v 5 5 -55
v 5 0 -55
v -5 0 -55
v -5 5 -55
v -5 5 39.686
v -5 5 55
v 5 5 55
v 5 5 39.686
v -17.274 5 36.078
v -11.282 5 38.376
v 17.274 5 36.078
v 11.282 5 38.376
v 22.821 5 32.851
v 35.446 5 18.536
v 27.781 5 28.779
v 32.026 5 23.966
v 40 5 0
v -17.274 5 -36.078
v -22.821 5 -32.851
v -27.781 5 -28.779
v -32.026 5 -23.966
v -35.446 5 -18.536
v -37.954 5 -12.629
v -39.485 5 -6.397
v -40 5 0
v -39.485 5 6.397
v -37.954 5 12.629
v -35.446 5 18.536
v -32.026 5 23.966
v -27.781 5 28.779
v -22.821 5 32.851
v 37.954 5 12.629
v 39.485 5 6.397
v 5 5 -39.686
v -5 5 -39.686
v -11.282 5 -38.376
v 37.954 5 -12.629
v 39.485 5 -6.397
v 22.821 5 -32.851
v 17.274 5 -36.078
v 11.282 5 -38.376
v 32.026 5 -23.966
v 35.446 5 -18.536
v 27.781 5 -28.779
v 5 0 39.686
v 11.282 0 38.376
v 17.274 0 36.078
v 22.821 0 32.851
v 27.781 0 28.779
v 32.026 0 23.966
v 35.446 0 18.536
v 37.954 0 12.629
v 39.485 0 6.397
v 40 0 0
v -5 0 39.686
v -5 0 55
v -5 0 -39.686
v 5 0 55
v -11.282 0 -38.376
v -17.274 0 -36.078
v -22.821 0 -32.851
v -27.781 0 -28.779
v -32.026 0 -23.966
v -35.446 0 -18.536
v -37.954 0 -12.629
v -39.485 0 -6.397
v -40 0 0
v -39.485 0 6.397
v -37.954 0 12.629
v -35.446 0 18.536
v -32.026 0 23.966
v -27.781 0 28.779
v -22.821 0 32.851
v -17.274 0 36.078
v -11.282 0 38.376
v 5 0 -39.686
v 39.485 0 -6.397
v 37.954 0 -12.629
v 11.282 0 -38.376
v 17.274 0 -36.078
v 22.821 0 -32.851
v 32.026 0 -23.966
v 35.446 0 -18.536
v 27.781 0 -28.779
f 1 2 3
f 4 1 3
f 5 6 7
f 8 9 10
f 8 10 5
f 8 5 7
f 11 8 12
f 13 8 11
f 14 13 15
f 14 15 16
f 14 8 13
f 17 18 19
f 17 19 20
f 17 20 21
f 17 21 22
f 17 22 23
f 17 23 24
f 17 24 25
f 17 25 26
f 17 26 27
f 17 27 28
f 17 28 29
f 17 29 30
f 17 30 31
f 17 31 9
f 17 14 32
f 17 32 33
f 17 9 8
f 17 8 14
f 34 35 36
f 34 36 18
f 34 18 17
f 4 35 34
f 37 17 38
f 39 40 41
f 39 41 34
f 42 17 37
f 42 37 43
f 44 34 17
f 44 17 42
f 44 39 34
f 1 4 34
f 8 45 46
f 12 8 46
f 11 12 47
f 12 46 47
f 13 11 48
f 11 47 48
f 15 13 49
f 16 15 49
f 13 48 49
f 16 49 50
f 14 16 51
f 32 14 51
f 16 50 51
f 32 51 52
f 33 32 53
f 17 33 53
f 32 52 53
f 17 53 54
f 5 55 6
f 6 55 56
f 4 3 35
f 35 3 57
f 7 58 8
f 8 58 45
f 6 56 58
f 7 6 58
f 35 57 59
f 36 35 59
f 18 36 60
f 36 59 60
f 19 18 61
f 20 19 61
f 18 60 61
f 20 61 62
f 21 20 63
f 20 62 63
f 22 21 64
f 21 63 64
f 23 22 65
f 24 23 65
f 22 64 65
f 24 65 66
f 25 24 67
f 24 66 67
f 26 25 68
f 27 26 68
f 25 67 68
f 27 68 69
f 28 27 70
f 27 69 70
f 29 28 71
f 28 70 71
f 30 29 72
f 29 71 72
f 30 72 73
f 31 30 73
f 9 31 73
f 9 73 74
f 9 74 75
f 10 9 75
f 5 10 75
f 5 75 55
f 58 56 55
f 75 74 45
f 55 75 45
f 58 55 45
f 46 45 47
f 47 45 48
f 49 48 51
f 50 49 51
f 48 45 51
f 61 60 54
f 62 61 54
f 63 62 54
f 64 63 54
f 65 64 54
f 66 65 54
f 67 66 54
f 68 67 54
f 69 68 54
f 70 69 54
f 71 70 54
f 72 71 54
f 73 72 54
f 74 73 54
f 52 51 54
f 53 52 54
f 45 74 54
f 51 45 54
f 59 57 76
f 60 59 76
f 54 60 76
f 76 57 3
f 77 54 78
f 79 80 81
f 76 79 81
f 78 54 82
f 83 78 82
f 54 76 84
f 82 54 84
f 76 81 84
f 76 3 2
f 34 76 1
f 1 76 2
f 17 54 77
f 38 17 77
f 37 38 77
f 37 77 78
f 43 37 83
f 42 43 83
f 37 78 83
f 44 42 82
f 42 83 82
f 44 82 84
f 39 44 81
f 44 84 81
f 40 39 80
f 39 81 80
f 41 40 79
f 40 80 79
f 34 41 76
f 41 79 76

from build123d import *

# Parameters (mm, degrees)
BOSS_EXTRUDE1_DEPTH = 5


with BuildPart() as part:
    # Sketch1 → Boss-Extrude1 (new body)
    with BuildSketch(Plane(origin=(0, 0, 0), x_dir=(1, 0, 0), z_dir=(0, 1, 0))):
        with BuildLine():
            ThreePointArc((-5, 39.686269666), (-40, 0), (-5, -39.686269666))
            Line((-5, -39.686269666), (-5, 39.686269666))
        make_face()
        with BuildLine():
            ThreePointArc((-5, 39.686269666), (0, 40), (5, 39.686269666))
            Line((5, 39.686269666), (5, 55))
            Line((5, 55), (-5, 55))
            Line((-5, 55), (-5, 39.686269666))
        make_face()
        with BuildLine():
            Line((5, 39.686269666), (5, -39.686269666))
            ThreePointArc((5, -39.686269666), (30, -26.457513111), (40, 0))
            ThreePointArc((40, 0), (30, 26.457513111), (5, 39.686269666))
        make_face()
        with BuildLine():
            ThreePointArc((-5, -39.686269666), (0, -40), (5, -39.686269666))
            Line((5, -39.686269666), (5, 39.686269666))
            ThreePointArc((5, 39.686269666), (0, 40), (-5, 39.686269666))
            Line((-5, 39.686269666), (-5, -39.686269666))
        make_face()
        with BuildLine():
            Line((-5, -55), (5, -55))
            Line((5, -55), (5, -39.686269666))
            ThreePointArc((5, -39.686269666), (0, -40), (-5, -39.686269666))
            Line((-5, -39.686269666), (-5, -55))
        make_face()
    extrude(amount=BOSS_EXTRUDE1_DEPTH)


solid = part.part
